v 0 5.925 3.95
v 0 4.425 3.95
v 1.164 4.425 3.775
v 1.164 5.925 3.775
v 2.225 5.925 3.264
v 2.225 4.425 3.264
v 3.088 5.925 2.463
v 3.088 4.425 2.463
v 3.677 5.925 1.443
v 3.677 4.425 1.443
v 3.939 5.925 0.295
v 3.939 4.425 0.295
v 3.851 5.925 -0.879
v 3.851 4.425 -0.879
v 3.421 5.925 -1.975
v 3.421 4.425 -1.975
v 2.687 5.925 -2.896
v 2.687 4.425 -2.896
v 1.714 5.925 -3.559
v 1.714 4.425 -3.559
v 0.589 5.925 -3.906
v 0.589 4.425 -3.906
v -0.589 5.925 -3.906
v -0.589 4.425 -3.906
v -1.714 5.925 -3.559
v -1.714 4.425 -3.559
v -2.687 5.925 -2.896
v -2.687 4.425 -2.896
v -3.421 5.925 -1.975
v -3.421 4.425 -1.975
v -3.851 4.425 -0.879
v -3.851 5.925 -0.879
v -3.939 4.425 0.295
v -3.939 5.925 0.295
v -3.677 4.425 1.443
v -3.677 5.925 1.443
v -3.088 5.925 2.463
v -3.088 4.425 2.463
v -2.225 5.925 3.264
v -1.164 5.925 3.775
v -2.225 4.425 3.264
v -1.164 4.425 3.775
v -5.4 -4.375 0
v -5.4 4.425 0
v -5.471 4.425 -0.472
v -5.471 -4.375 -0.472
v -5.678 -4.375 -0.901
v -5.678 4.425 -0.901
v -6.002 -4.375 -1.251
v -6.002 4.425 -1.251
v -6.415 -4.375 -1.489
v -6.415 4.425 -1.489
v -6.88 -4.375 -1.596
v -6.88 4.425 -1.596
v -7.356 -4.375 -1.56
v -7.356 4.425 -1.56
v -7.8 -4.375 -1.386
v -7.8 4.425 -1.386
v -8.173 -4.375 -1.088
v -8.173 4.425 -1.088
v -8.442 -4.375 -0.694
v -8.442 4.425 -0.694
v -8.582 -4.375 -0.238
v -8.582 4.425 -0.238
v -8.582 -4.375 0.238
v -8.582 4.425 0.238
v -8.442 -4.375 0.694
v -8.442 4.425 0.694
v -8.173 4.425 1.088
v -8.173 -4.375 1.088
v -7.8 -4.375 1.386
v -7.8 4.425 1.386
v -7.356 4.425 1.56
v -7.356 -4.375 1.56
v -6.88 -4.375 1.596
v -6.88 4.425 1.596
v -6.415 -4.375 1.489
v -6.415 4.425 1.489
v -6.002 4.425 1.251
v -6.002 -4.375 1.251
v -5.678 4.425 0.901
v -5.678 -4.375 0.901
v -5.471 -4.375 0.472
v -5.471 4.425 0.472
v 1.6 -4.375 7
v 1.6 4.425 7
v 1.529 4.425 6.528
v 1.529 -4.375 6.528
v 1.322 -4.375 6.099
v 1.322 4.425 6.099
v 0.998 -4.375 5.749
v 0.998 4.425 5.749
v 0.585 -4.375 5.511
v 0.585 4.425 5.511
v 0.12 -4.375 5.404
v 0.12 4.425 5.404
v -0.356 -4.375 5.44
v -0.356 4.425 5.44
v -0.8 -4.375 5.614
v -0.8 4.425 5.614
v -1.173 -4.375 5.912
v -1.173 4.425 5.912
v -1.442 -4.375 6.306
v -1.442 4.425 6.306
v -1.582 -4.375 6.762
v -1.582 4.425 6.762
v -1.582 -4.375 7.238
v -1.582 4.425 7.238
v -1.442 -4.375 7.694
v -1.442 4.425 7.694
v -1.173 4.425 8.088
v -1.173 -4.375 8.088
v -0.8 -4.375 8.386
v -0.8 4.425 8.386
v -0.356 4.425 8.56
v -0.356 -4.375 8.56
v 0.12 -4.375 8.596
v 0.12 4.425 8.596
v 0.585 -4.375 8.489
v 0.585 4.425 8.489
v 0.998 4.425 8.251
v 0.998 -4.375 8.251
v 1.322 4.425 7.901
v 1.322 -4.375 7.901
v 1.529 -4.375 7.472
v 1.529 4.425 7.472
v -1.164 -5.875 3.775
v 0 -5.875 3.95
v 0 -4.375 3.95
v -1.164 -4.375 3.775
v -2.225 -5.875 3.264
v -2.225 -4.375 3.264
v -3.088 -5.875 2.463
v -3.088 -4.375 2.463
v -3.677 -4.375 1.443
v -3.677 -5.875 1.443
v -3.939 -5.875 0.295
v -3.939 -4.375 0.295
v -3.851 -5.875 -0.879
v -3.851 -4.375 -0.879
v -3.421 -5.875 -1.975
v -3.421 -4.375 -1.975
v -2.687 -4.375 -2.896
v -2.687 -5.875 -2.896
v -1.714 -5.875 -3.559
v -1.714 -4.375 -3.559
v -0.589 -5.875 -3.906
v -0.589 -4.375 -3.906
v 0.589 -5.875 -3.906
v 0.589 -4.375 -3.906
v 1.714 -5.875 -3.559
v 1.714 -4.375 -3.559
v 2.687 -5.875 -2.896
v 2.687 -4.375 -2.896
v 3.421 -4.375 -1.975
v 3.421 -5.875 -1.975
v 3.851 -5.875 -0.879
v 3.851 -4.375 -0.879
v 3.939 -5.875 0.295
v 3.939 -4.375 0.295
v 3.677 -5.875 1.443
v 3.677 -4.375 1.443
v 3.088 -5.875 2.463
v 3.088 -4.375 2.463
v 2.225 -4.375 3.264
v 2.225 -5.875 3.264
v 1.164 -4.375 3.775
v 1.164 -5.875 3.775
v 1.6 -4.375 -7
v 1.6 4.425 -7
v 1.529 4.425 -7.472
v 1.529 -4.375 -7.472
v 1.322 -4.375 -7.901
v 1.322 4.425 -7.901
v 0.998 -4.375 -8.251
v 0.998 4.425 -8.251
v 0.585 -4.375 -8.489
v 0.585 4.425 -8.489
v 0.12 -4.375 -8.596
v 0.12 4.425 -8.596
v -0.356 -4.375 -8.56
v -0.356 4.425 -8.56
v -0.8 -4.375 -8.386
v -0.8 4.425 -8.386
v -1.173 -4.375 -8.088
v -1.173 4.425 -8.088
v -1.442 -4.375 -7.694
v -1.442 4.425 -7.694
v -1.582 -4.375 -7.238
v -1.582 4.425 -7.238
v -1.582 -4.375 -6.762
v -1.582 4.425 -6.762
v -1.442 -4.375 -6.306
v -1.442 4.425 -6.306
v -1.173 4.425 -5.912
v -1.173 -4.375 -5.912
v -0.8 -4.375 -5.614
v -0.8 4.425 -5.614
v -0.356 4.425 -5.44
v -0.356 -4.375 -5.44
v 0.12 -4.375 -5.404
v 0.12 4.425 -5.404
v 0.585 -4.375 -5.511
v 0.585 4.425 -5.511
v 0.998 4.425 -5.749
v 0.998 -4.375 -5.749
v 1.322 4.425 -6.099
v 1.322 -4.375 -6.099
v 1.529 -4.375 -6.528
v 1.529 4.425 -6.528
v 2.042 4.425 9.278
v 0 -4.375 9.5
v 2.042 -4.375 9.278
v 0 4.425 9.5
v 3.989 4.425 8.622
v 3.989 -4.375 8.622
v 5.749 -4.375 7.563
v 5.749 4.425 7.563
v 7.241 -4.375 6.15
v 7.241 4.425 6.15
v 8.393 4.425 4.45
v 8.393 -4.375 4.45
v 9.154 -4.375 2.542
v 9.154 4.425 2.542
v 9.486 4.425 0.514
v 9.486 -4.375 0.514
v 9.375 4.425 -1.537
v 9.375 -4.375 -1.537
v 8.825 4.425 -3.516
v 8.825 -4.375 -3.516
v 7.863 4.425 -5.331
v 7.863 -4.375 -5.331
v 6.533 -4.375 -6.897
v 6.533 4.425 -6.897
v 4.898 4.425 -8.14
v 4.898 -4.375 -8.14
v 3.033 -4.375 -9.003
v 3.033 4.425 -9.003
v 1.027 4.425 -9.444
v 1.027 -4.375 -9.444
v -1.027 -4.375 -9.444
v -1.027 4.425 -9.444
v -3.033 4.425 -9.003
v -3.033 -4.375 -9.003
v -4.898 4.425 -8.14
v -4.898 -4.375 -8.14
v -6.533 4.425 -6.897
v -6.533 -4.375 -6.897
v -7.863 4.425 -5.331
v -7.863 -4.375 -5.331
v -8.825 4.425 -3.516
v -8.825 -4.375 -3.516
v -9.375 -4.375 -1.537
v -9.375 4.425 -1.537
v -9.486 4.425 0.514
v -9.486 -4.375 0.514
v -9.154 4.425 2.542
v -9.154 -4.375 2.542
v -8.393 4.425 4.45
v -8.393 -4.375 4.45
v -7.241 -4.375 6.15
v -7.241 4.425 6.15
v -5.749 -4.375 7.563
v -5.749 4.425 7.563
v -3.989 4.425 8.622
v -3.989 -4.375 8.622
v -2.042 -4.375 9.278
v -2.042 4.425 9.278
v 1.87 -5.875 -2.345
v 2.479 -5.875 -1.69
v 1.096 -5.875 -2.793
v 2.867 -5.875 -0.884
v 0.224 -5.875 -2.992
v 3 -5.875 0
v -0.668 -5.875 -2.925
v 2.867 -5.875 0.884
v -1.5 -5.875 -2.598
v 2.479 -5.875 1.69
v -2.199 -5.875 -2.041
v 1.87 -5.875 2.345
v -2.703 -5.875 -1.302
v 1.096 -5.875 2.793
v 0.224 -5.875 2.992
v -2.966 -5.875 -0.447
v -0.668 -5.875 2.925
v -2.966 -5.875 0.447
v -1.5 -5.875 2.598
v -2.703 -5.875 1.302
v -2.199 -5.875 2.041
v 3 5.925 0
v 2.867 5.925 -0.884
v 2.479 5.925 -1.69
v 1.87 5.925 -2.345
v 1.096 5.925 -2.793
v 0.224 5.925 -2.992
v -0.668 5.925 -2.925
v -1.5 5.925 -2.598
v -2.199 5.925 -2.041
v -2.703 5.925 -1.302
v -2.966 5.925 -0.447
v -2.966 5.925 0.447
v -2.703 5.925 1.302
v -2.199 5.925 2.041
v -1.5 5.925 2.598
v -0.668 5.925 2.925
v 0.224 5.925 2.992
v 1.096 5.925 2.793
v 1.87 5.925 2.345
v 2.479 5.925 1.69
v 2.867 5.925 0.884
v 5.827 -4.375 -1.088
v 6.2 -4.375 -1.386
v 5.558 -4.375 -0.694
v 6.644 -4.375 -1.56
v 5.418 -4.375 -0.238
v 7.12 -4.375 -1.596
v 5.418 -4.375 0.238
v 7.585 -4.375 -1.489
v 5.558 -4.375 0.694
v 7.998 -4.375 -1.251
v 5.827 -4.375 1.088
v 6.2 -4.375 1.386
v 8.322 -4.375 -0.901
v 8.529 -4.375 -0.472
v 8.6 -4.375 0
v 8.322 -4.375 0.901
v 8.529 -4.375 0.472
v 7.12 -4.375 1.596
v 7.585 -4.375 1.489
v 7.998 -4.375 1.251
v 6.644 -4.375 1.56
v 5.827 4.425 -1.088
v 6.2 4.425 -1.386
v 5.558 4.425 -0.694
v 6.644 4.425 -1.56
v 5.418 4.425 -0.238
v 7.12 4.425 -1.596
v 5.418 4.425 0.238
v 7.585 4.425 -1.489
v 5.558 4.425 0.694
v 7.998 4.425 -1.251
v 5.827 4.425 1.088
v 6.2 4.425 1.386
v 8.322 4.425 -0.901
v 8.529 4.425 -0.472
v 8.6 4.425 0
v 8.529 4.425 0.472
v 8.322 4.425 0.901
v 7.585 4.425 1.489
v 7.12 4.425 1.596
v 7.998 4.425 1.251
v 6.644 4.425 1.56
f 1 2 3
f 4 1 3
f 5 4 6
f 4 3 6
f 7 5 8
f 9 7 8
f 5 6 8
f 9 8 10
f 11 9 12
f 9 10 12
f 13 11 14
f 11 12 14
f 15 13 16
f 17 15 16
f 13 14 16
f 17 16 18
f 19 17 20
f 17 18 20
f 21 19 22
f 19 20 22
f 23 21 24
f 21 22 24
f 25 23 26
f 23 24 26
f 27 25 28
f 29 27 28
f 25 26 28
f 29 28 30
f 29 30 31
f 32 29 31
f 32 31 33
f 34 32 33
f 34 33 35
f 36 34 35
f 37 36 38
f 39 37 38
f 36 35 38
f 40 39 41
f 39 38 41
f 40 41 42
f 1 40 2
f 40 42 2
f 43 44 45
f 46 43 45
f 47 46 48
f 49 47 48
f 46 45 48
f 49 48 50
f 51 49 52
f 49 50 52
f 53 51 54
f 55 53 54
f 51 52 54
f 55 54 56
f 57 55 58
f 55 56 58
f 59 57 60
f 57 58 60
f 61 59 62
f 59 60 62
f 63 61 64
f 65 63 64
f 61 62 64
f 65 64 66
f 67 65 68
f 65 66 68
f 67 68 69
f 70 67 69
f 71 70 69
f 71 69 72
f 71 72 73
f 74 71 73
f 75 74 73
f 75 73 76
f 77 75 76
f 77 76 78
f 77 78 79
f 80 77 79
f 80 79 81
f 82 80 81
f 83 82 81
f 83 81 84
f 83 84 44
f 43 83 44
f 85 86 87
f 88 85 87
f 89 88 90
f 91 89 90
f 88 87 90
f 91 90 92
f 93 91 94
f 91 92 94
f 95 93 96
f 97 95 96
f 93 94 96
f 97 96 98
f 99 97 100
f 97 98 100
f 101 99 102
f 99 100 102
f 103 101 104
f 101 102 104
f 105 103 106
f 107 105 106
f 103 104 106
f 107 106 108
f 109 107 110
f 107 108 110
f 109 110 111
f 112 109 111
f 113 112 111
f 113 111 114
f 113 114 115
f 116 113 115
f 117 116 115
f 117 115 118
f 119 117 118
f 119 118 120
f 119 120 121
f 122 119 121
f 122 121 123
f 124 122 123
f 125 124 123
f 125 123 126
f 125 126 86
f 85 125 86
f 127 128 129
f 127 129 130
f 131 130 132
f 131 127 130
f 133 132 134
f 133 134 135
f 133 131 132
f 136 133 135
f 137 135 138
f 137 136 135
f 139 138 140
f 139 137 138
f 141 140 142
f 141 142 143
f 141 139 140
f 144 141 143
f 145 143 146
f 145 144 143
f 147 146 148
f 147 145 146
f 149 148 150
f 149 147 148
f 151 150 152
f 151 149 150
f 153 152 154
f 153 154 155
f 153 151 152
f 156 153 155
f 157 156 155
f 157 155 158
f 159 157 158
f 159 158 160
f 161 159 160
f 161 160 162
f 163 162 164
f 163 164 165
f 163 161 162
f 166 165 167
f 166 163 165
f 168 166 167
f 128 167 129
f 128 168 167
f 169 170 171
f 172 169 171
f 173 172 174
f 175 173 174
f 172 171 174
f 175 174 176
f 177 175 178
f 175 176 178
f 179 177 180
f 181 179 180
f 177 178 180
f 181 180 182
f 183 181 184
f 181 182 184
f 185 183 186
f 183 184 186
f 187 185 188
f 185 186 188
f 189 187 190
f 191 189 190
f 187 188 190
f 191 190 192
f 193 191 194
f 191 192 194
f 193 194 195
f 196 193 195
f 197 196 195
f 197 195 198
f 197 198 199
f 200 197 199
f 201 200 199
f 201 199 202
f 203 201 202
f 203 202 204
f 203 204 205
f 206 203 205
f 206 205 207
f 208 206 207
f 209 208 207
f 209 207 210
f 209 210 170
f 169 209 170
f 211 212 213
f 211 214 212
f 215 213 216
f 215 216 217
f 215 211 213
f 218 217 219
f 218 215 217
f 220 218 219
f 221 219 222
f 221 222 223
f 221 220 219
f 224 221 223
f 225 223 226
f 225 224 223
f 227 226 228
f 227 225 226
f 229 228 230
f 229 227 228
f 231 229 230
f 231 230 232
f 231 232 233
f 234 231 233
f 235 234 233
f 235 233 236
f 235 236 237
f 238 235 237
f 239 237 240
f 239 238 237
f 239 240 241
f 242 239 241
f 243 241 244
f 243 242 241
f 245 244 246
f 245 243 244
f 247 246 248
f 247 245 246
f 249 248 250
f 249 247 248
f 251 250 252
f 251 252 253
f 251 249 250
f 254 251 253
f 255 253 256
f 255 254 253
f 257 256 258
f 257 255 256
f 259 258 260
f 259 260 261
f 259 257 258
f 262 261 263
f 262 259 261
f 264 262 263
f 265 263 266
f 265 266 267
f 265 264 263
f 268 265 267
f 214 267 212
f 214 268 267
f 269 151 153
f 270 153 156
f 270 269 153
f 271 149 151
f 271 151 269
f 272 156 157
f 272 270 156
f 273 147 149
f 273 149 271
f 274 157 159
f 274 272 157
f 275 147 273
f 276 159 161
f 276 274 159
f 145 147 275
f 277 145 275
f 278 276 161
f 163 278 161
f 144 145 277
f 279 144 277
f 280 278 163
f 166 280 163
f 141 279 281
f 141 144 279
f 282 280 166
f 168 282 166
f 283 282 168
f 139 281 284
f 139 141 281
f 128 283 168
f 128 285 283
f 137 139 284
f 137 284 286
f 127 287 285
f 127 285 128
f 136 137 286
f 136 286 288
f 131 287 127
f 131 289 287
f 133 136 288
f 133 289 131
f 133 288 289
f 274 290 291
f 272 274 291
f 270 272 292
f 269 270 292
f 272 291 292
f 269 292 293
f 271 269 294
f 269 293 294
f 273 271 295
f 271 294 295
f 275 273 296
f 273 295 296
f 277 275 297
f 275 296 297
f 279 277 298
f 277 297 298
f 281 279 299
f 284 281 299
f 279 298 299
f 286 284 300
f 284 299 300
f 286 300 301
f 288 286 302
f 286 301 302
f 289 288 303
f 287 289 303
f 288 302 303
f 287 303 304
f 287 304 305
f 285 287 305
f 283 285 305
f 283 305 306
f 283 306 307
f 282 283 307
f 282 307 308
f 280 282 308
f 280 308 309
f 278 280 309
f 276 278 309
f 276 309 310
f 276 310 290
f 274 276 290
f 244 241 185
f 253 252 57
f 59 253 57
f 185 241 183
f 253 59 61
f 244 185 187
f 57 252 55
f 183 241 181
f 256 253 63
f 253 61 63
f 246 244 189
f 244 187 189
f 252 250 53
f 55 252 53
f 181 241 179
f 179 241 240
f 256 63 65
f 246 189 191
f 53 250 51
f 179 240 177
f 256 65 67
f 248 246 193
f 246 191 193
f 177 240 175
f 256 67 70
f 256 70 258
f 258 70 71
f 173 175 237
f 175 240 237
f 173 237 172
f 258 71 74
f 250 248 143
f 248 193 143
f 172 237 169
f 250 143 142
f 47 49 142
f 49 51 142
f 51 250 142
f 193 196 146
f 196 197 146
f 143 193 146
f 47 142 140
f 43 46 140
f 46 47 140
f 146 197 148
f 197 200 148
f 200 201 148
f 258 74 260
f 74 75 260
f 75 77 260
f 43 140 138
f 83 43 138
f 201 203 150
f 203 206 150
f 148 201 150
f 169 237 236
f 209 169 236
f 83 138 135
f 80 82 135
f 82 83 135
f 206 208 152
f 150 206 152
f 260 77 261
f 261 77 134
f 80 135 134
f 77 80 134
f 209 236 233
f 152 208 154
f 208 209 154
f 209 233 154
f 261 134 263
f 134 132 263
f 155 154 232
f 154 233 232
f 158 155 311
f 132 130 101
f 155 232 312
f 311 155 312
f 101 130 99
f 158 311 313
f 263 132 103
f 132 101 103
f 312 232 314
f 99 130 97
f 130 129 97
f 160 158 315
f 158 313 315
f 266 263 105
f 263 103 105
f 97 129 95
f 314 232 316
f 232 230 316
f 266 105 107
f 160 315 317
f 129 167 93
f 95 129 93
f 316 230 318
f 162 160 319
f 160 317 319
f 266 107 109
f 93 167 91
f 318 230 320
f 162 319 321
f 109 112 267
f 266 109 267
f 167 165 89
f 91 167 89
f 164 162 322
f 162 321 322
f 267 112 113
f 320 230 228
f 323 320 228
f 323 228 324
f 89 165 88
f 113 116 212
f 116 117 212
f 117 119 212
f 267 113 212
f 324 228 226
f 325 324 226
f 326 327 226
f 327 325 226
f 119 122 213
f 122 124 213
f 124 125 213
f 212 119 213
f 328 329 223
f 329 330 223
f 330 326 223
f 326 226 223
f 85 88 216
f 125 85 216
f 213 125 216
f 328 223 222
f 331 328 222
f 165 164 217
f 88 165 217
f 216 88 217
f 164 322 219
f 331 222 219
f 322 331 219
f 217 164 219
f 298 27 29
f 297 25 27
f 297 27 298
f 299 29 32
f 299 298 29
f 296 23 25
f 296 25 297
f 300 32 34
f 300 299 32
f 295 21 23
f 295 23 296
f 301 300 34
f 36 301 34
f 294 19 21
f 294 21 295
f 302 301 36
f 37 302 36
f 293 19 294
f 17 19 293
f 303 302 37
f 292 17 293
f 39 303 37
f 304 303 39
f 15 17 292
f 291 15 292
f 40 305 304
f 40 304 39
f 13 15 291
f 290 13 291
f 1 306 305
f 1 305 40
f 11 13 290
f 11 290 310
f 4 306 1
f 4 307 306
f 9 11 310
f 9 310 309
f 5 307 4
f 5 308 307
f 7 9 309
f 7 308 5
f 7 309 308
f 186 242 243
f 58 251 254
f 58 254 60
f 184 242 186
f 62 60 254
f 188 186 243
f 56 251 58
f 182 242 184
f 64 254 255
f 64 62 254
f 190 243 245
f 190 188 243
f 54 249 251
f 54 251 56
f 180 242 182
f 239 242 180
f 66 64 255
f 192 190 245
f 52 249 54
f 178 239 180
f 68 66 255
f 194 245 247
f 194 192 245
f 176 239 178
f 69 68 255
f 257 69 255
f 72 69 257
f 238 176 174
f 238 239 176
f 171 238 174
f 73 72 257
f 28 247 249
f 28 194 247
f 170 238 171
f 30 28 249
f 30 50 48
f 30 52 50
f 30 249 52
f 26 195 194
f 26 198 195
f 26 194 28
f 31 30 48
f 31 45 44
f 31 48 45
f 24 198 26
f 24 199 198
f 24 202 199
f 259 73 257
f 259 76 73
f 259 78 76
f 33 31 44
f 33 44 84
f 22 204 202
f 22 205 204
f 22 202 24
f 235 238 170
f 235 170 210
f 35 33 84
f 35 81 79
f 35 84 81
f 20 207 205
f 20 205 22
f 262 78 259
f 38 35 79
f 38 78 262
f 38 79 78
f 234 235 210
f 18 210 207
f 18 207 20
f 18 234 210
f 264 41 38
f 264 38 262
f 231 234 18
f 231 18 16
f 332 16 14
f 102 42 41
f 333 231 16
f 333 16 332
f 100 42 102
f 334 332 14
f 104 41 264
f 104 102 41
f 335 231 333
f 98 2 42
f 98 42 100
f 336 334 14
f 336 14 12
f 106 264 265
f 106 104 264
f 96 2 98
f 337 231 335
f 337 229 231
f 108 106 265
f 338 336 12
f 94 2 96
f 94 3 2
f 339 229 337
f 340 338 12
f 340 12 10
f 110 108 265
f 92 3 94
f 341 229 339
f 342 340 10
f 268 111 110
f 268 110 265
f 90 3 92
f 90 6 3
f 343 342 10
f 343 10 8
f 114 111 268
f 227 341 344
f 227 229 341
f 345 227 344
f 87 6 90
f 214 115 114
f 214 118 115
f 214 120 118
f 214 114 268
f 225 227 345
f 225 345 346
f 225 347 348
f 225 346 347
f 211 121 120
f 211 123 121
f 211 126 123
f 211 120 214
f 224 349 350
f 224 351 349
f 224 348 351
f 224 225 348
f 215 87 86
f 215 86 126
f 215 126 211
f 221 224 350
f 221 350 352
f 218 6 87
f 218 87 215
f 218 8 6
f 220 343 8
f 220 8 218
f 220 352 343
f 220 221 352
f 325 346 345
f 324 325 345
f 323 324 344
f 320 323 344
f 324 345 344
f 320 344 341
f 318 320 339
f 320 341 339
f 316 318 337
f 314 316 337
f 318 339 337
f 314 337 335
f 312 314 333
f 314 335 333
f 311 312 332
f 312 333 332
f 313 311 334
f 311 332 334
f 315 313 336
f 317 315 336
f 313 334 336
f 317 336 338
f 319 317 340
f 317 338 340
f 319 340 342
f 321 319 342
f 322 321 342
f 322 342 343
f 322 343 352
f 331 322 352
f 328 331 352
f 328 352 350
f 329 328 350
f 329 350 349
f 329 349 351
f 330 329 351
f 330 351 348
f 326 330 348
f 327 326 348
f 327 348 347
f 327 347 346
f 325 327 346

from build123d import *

# Parameters (mm, degrees)
SKETCH_1_W                  = 9.5
SKETCH_1_H                  = 8.8
SKETCH_2_R                  = 3.95
EXTRUDE_1_DEPTH             = 1.5
EXTRUDE_START               = 1.5
SKETCH_3_R                  = 3.95
EXTRUDE_2_DEPTH             = 1.5
HOLE_WIZARD_3_2_3_2_1_D     = 3.2
HOLE_WIZARD_3_2_3_2_1_DEPTH = 10.3
HOLE_WIZARD_6_0_6_1_D       = 6


with BuildPart() as part:
    # 草图1 → 旋转1 (revolve)
    with BuildSketch(Plane(origin=(0, 0, 0), x_dir=(-1, 0, 0), z_dir=(0, 0, -1)), mode=Mode.PRIVATE) as revolve_1_sk:
        with Locations((-4.75, 0.025)):
            Rectangle(SKETCH_1_W, SKETCH_1_H)
    revolve(revolve_1_sk.sketch.rotate(Axis((0, -4.375, 0), (0, 1, 0)), 270), axis=Axis((0, -4.375, 0), (0, 1, 0)))

    # 草图2 → 凸台-拉伸1 (add)
    with BuildSketch(Plane(origin=(0, 4.425, 0), x_dir=(-1, 0, 0), z_dir=(0, 1, 0))):
        with Locations(Location((0, 0, 0), (0, 0, 90))):
            Circle(SKETCH_2_R)
    extrude(amount=EXTRUDE_1_DEPTH)

    # 草图3 → 凸台-拉伸2 (add)
    with BuildSketch(Plane.XZ.offset(4.375).offset(EXTRUDE_START)):
        with Locations(Location((0, 0, 0), (0, 0, 90))):
            Circle(SKETCH_3_R)
    extrude(amount=-EXTRUDE_2_DEPTH)

    # Ø3.2 (3.2) 直径孔1
    with Locations(Plane(origin=(0, -4.375, 0), x_dir=(-1, 0, 0), z_dir=(0, -1, 0))):
        with Locations((0, 7), (-7, 0), (0, -7), (7, 0)):
            Hole(HOLE_WIZARD_3_2_3_2_1_D / 2, depth=HOLE_WIZARD_3_2_3_2_1_DEPTH)

    # Ø6.0 (6) 直径孔1 (through all)
    with Locations(Plane(origin=(0, -5.875, 0), x_dir=(-1, 0, 0), z_dir=(0, -1, 0))):
        with Locations((0, 0)):
            Hole(HOLE_WIZARD_6_0_6_1_D / 2)


solid = part.part
